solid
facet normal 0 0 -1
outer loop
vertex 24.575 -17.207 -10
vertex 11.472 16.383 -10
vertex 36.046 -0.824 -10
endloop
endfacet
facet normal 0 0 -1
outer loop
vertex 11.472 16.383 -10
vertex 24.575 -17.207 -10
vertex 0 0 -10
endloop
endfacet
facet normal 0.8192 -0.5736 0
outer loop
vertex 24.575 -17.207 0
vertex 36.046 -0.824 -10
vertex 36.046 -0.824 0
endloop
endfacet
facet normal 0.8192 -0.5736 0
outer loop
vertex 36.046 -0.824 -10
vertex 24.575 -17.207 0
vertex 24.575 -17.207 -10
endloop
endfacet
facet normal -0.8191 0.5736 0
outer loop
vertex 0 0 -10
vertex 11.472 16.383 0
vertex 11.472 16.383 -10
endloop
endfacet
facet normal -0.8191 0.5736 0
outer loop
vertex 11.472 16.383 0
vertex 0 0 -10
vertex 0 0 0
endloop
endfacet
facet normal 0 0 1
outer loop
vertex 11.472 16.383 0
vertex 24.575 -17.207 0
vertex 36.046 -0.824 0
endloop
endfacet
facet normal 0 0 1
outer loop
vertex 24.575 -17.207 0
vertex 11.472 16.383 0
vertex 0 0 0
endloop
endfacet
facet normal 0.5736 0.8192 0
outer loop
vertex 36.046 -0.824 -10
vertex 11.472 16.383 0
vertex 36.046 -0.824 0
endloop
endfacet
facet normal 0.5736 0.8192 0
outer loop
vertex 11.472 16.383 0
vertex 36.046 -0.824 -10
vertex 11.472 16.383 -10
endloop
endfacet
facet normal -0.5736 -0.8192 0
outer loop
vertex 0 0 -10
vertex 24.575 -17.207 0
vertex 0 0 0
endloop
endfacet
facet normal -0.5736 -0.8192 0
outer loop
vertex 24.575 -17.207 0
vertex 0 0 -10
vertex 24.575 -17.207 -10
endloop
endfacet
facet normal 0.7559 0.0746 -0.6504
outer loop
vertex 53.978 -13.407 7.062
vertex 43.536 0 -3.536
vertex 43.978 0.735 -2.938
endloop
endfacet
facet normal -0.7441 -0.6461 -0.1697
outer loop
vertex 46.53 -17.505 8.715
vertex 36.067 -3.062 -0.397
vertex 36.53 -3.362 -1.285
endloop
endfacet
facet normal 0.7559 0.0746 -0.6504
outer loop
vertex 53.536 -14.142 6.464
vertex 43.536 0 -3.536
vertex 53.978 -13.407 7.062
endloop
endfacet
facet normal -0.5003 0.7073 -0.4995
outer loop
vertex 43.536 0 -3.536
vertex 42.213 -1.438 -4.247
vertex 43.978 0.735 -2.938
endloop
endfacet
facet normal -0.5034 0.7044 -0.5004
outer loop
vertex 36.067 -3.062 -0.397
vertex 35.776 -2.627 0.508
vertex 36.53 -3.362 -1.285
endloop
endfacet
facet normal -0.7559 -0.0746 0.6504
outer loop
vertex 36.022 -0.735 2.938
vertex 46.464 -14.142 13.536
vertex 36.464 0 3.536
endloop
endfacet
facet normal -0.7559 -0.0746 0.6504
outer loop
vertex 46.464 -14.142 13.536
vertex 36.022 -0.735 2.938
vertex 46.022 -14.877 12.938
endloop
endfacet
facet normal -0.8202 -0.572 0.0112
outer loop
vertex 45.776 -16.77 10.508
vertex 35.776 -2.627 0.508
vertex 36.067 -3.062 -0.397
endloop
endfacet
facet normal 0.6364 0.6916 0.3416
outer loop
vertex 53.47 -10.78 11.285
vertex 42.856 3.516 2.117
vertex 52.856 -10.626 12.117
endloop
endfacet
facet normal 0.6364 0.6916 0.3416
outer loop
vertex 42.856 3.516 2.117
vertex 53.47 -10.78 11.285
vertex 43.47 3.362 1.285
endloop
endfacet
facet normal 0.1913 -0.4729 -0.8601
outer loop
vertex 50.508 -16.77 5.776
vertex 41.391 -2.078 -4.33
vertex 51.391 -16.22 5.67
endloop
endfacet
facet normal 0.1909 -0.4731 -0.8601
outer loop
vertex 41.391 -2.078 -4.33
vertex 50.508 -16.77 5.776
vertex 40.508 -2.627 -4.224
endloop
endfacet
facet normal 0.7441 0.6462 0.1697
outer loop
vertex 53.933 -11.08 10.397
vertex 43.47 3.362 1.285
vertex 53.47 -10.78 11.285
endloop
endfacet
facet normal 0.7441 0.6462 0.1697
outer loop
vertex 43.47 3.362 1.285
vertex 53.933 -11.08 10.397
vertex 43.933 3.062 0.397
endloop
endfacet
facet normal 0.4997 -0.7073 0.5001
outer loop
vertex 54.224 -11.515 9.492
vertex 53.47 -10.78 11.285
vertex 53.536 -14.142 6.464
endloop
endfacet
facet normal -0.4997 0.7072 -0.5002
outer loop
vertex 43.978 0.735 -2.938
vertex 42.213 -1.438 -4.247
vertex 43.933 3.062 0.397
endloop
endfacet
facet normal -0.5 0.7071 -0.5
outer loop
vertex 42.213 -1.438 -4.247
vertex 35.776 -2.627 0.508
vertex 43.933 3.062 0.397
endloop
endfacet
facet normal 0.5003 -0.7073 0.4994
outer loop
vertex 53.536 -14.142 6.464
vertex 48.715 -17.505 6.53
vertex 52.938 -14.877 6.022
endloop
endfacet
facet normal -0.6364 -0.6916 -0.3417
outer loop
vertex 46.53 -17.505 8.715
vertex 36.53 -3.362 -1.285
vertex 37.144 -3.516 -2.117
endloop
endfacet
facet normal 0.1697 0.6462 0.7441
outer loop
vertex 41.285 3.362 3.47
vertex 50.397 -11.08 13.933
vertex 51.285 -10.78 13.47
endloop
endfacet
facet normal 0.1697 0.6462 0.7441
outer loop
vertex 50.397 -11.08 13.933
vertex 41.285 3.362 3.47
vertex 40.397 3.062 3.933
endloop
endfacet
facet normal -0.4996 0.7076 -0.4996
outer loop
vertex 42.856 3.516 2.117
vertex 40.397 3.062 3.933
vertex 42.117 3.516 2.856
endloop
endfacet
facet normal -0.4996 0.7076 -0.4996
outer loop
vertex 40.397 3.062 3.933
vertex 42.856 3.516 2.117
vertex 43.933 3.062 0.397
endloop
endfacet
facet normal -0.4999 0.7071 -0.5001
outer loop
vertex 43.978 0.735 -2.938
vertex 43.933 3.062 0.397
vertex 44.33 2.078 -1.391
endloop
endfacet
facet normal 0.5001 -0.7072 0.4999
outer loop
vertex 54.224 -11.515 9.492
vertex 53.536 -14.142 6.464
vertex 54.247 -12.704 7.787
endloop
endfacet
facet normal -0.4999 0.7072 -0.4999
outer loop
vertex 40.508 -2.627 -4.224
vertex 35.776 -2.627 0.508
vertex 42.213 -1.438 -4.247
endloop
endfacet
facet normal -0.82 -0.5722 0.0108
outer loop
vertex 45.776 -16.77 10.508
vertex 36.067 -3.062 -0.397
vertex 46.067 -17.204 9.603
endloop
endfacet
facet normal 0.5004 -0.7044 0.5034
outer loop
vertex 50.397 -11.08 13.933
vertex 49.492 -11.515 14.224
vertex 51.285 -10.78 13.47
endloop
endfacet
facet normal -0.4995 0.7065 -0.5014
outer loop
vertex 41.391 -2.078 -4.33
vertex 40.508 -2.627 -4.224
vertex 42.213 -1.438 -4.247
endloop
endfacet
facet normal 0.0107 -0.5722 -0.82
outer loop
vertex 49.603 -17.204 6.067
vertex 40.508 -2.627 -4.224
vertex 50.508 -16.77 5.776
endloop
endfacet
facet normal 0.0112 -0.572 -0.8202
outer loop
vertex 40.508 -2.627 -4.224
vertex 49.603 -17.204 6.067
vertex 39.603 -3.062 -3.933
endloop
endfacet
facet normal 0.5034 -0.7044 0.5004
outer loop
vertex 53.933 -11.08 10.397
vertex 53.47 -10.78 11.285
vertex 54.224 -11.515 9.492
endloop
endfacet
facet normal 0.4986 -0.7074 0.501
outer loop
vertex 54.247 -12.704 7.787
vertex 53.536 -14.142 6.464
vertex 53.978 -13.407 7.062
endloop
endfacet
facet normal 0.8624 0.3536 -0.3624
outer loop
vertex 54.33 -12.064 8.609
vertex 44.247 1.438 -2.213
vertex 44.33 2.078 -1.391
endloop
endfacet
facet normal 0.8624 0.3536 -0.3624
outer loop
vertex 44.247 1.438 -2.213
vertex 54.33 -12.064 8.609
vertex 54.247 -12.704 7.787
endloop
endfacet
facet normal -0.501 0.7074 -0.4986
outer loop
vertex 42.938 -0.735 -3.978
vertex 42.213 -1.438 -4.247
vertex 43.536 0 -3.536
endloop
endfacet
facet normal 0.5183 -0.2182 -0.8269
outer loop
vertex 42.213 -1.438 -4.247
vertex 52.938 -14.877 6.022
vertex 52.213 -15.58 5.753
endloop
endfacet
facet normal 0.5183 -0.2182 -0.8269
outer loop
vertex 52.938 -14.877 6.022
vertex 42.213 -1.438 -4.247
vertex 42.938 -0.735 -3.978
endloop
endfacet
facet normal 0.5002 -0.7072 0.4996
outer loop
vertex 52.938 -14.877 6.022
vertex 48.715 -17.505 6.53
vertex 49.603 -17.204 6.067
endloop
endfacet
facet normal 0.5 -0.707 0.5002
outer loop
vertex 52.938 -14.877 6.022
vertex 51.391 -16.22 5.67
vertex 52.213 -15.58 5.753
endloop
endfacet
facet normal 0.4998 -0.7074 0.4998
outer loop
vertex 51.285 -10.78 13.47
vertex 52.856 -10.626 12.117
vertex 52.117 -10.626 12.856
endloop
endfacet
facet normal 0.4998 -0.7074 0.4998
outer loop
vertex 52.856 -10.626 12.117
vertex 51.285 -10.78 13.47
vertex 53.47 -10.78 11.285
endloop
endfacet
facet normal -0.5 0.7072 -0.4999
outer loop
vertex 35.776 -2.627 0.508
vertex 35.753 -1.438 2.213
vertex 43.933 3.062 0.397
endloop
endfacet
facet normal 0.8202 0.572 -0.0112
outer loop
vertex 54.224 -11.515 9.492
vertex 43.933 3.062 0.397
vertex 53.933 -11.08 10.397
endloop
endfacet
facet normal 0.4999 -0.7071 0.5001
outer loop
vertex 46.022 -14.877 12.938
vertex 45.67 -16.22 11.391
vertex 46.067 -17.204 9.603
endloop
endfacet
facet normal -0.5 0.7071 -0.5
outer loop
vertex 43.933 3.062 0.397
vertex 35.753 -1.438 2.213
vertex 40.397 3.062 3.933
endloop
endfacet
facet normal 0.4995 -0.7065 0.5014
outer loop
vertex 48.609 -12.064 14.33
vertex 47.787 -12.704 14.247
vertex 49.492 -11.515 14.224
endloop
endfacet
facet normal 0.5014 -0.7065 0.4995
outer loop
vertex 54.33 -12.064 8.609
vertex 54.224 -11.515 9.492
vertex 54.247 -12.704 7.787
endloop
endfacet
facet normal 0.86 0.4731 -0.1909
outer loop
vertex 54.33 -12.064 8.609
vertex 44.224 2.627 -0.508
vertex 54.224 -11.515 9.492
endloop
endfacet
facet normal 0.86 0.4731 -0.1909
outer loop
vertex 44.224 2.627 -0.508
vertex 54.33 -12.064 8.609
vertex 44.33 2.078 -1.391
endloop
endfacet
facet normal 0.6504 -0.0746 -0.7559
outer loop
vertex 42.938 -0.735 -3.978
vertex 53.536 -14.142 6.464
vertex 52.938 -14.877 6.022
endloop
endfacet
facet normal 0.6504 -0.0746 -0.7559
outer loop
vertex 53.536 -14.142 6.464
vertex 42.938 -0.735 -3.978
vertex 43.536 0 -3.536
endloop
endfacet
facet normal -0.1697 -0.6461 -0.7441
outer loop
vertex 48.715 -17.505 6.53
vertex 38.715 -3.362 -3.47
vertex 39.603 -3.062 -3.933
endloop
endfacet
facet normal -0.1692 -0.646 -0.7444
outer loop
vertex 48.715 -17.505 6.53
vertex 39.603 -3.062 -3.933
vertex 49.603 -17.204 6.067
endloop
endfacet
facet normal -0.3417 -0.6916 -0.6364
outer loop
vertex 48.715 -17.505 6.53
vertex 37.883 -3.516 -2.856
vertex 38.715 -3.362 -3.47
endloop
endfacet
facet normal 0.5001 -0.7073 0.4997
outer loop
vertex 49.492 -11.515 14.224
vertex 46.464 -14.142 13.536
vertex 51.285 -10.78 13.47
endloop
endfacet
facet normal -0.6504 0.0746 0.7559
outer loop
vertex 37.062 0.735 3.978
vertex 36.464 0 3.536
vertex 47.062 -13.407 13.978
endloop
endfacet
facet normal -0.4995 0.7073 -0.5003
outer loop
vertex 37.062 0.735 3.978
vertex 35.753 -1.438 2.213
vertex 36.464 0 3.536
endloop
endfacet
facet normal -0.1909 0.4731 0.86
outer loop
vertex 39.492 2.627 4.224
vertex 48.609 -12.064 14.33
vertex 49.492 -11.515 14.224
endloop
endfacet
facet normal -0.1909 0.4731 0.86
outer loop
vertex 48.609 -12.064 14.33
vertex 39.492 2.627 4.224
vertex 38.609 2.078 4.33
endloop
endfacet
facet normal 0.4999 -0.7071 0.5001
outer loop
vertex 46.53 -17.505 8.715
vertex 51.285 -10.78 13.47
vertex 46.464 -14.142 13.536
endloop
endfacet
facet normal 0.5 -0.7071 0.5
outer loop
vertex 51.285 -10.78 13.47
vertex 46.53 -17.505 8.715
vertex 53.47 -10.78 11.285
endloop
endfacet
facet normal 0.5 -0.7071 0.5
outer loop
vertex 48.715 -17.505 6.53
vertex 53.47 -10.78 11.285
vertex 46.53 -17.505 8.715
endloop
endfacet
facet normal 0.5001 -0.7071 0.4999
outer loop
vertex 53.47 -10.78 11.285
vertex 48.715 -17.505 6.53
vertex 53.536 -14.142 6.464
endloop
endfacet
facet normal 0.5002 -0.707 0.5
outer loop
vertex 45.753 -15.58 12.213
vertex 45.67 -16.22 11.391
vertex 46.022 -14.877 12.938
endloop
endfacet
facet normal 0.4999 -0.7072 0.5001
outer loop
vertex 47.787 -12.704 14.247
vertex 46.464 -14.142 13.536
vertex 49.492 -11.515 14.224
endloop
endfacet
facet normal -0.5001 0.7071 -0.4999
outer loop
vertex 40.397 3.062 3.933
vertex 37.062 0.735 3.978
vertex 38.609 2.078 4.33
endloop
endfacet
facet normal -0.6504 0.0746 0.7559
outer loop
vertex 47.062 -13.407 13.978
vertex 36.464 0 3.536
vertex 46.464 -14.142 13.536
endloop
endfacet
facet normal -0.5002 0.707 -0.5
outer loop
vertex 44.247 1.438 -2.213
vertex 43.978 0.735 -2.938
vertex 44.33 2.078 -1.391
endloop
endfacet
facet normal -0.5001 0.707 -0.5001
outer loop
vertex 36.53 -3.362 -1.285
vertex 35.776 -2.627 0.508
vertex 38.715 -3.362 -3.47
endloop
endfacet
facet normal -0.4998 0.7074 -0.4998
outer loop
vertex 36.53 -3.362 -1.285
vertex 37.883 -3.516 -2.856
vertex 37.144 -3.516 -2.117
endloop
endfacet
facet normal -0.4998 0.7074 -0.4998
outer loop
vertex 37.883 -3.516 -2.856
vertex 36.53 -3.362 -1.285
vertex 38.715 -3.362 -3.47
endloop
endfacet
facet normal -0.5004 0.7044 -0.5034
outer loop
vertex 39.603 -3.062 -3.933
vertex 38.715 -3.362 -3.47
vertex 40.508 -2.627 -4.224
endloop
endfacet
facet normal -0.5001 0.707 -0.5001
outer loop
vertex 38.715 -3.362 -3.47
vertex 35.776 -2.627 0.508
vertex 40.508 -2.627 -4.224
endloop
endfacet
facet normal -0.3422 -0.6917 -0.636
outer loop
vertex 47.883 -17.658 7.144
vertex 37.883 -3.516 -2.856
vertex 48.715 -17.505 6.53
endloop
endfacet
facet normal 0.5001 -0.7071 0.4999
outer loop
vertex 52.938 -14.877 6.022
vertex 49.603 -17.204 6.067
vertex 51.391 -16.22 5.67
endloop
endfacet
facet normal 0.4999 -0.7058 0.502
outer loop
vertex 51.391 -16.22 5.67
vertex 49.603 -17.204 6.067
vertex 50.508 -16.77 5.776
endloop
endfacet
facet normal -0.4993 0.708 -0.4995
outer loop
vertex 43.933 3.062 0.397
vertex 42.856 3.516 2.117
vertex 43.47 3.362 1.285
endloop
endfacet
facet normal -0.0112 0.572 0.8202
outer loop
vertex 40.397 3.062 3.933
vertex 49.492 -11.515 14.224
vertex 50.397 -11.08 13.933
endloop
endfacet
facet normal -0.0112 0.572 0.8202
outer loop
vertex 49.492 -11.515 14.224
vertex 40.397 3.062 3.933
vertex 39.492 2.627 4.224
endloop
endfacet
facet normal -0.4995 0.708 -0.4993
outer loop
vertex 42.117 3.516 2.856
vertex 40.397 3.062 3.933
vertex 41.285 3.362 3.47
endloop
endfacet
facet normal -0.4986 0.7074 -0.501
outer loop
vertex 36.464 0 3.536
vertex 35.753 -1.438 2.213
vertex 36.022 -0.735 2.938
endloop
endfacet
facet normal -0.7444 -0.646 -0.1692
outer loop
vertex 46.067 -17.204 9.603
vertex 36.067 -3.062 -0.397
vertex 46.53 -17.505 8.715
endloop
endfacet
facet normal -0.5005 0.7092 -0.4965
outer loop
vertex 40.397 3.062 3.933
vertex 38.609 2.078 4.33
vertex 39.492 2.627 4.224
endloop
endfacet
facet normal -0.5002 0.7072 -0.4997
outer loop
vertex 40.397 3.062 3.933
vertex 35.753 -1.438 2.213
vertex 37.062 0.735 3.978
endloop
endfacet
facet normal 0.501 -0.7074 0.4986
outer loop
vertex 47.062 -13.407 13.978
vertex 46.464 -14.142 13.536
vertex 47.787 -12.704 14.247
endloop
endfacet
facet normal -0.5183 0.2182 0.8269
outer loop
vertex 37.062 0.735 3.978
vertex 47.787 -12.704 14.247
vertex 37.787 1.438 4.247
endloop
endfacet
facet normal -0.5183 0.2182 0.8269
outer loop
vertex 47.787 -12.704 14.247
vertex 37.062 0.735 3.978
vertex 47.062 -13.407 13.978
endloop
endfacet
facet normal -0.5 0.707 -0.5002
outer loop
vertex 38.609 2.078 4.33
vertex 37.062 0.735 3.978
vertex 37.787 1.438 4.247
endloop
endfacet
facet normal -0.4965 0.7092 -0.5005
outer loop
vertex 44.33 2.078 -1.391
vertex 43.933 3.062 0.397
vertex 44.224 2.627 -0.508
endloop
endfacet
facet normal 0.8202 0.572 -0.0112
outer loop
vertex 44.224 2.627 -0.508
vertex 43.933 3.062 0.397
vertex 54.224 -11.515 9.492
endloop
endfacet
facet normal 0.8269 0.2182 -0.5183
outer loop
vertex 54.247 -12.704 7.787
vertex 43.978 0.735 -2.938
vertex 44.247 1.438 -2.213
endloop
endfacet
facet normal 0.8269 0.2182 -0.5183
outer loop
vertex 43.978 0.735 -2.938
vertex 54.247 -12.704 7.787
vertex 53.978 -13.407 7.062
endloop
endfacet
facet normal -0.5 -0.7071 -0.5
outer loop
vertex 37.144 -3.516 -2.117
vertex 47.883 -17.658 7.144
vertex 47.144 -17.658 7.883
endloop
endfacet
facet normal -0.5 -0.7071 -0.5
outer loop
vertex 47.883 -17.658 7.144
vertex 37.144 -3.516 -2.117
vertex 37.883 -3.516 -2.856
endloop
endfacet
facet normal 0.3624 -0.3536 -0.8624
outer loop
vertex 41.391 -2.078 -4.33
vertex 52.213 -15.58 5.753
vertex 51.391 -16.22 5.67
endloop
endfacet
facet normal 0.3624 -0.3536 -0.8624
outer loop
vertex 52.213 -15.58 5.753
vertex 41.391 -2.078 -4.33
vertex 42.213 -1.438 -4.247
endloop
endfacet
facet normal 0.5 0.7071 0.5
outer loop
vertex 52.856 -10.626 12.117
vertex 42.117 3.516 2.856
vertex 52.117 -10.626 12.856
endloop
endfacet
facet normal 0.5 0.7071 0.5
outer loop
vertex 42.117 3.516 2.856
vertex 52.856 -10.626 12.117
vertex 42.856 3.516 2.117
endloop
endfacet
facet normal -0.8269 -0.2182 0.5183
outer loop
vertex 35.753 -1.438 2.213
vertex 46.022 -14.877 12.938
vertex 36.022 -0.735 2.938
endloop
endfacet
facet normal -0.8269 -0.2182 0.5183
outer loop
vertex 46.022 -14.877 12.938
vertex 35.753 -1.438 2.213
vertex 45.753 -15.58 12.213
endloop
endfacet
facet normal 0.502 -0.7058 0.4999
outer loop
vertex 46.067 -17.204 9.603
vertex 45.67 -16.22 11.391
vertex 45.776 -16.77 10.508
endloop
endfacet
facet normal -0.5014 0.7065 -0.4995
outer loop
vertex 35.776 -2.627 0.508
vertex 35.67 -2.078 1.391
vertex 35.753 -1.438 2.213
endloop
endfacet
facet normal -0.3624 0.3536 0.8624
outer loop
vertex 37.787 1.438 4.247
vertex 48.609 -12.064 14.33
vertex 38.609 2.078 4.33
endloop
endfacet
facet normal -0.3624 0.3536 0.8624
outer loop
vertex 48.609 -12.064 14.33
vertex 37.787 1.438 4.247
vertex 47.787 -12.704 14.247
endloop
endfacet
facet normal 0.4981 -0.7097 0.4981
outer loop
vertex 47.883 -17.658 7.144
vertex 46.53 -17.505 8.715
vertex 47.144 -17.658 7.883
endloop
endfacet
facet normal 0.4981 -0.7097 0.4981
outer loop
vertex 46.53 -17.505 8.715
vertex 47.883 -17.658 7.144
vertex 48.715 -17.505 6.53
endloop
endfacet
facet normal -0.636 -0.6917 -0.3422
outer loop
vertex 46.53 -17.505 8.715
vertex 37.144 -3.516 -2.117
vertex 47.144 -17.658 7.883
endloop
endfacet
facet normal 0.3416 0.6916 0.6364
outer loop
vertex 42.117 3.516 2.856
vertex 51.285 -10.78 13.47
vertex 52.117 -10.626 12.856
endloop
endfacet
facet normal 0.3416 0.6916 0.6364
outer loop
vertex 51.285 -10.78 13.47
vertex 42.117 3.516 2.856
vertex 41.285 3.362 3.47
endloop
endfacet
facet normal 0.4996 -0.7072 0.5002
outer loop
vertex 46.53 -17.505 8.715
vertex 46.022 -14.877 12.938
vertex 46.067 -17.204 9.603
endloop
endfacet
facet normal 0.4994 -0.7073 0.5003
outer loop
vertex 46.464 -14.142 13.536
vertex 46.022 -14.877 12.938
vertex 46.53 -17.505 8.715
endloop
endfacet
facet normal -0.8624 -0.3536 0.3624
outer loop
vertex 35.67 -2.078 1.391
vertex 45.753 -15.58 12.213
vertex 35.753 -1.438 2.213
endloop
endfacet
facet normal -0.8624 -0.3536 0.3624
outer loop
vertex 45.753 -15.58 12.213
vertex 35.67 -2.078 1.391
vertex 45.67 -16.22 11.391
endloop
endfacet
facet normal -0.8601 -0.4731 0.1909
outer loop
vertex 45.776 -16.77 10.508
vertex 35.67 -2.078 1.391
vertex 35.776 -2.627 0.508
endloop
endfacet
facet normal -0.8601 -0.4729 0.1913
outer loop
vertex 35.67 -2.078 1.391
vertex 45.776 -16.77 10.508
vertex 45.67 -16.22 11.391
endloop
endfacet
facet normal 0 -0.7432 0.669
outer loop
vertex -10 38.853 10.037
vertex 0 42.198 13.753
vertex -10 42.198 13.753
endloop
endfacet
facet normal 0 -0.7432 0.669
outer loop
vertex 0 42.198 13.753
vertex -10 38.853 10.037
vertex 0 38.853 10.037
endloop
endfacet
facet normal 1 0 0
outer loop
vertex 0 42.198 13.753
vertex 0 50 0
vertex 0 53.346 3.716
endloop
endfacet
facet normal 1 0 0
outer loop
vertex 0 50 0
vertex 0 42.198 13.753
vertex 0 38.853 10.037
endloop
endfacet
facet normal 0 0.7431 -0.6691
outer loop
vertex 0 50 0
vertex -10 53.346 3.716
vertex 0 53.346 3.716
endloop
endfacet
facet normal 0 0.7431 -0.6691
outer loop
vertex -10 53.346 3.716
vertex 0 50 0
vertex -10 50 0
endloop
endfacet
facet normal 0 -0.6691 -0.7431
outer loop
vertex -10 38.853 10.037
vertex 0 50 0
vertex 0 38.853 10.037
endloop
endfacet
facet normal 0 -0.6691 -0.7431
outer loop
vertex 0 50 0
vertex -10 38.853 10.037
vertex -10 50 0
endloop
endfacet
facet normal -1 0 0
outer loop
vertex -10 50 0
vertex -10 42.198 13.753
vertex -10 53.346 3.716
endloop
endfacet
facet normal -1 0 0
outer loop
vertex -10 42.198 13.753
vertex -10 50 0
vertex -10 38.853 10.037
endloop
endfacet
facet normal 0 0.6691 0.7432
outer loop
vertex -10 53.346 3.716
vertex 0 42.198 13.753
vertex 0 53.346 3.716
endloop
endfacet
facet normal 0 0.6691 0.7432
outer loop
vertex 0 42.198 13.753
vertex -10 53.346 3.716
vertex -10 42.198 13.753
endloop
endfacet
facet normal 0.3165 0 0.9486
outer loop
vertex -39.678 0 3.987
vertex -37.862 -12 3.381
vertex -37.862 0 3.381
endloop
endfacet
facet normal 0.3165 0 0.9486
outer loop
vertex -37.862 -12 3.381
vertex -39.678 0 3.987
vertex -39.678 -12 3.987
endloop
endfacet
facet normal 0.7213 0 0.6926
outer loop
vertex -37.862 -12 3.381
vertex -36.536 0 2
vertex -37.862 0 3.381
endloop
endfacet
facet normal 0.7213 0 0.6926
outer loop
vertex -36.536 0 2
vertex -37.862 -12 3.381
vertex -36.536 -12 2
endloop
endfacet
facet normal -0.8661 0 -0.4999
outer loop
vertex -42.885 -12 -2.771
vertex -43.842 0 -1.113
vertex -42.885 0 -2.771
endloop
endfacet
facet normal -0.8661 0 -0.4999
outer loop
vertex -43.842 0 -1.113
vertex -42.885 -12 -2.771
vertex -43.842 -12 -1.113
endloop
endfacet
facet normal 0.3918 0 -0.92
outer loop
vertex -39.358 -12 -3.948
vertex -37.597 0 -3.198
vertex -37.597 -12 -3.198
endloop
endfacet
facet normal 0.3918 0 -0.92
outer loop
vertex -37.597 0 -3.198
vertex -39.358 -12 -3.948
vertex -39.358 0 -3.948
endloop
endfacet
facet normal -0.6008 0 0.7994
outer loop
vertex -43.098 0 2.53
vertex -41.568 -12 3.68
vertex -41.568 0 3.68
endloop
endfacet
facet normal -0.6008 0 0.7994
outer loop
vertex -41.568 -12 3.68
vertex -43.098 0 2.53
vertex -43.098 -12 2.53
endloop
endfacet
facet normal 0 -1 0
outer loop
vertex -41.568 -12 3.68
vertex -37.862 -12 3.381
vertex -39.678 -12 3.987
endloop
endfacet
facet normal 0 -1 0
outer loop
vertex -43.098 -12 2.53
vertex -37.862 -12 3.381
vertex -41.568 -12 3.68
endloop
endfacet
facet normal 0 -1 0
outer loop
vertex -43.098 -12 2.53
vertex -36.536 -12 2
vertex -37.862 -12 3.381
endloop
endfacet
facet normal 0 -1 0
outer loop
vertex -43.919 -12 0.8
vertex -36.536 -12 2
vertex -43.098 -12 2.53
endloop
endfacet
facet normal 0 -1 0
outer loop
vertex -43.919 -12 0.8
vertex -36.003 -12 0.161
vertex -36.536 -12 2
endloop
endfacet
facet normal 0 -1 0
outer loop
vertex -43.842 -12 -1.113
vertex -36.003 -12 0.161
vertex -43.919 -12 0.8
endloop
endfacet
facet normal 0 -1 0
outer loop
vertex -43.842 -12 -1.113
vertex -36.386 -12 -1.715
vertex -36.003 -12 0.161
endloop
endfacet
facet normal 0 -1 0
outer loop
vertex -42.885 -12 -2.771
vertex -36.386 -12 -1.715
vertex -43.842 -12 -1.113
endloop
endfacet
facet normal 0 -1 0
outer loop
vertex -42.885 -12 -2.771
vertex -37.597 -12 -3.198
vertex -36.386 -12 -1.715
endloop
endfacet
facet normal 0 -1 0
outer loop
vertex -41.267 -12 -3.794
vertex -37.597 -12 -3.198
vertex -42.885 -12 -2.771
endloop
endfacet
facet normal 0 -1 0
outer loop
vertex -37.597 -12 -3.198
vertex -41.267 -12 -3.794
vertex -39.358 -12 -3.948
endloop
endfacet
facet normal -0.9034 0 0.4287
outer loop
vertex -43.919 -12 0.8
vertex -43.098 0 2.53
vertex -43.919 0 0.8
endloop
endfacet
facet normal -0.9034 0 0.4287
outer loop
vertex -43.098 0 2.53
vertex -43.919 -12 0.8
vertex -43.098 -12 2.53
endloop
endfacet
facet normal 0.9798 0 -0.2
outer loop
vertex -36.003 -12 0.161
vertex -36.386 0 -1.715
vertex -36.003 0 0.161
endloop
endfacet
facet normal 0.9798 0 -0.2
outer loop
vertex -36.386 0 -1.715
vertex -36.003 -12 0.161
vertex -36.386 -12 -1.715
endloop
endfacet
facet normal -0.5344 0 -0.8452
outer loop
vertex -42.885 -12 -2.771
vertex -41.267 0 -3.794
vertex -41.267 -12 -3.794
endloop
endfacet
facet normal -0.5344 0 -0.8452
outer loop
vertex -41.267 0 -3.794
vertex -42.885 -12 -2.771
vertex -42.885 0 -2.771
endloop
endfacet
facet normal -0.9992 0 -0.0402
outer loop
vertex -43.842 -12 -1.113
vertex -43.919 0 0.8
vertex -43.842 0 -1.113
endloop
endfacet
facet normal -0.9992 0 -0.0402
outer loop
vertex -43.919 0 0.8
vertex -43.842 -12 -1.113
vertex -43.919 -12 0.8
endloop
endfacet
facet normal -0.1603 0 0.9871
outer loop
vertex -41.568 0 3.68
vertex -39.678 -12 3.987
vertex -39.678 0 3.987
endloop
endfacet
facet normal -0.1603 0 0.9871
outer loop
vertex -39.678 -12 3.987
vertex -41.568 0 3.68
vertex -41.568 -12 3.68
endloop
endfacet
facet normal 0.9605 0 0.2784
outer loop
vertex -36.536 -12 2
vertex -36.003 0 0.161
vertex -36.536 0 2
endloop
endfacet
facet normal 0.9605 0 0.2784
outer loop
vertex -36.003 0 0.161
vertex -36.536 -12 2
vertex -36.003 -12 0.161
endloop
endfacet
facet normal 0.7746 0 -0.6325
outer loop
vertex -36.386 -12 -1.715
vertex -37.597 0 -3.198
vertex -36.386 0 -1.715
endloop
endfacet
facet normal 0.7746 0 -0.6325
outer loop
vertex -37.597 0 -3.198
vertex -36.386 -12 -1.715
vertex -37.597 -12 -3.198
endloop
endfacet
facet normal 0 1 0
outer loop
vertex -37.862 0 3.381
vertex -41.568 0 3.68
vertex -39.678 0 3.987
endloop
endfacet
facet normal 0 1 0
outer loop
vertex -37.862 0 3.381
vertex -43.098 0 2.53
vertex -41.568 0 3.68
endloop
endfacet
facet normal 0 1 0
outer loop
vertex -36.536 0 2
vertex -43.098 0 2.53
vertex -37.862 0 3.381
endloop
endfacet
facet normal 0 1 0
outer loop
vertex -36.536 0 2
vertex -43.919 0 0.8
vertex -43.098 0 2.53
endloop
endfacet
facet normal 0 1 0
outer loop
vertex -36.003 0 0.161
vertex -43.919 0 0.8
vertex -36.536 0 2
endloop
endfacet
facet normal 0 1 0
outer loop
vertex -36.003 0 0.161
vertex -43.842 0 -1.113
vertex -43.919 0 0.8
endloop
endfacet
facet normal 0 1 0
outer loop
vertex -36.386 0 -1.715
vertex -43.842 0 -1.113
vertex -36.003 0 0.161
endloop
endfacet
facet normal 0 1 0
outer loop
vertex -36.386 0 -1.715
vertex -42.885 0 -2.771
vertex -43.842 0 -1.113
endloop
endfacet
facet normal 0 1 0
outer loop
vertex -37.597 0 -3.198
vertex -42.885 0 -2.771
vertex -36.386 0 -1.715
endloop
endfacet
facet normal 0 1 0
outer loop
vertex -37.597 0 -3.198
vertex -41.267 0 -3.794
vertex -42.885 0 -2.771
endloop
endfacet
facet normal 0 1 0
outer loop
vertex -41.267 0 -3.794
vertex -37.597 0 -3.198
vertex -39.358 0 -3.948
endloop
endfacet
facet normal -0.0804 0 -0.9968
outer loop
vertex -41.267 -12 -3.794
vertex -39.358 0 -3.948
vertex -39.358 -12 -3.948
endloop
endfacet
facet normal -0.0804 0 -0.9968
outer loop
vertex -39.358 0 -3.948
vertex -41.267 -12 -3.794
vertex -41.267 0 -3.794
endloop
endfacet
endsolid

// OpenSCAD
// multi-axis rotate is extrinsic (Rz*Ry*Rx), not build123d's intrinsic Rot(x,y,z)
rotate([35, 90, 0]) cube([10, 20, 30]);
translate([40, 0, 0]) rotate([45, 45, 0]) cylinder(h = 20, r = 5, $fn = 30);
translate([0, 50, 0]) rotate([0, -48, 90]) cube([5, 10, 15]);
translate([-40, 0, 0]) rotate([90, 0, 0]) rotate([0, 0, 30]) cylinder(h = 12, r = 4);
